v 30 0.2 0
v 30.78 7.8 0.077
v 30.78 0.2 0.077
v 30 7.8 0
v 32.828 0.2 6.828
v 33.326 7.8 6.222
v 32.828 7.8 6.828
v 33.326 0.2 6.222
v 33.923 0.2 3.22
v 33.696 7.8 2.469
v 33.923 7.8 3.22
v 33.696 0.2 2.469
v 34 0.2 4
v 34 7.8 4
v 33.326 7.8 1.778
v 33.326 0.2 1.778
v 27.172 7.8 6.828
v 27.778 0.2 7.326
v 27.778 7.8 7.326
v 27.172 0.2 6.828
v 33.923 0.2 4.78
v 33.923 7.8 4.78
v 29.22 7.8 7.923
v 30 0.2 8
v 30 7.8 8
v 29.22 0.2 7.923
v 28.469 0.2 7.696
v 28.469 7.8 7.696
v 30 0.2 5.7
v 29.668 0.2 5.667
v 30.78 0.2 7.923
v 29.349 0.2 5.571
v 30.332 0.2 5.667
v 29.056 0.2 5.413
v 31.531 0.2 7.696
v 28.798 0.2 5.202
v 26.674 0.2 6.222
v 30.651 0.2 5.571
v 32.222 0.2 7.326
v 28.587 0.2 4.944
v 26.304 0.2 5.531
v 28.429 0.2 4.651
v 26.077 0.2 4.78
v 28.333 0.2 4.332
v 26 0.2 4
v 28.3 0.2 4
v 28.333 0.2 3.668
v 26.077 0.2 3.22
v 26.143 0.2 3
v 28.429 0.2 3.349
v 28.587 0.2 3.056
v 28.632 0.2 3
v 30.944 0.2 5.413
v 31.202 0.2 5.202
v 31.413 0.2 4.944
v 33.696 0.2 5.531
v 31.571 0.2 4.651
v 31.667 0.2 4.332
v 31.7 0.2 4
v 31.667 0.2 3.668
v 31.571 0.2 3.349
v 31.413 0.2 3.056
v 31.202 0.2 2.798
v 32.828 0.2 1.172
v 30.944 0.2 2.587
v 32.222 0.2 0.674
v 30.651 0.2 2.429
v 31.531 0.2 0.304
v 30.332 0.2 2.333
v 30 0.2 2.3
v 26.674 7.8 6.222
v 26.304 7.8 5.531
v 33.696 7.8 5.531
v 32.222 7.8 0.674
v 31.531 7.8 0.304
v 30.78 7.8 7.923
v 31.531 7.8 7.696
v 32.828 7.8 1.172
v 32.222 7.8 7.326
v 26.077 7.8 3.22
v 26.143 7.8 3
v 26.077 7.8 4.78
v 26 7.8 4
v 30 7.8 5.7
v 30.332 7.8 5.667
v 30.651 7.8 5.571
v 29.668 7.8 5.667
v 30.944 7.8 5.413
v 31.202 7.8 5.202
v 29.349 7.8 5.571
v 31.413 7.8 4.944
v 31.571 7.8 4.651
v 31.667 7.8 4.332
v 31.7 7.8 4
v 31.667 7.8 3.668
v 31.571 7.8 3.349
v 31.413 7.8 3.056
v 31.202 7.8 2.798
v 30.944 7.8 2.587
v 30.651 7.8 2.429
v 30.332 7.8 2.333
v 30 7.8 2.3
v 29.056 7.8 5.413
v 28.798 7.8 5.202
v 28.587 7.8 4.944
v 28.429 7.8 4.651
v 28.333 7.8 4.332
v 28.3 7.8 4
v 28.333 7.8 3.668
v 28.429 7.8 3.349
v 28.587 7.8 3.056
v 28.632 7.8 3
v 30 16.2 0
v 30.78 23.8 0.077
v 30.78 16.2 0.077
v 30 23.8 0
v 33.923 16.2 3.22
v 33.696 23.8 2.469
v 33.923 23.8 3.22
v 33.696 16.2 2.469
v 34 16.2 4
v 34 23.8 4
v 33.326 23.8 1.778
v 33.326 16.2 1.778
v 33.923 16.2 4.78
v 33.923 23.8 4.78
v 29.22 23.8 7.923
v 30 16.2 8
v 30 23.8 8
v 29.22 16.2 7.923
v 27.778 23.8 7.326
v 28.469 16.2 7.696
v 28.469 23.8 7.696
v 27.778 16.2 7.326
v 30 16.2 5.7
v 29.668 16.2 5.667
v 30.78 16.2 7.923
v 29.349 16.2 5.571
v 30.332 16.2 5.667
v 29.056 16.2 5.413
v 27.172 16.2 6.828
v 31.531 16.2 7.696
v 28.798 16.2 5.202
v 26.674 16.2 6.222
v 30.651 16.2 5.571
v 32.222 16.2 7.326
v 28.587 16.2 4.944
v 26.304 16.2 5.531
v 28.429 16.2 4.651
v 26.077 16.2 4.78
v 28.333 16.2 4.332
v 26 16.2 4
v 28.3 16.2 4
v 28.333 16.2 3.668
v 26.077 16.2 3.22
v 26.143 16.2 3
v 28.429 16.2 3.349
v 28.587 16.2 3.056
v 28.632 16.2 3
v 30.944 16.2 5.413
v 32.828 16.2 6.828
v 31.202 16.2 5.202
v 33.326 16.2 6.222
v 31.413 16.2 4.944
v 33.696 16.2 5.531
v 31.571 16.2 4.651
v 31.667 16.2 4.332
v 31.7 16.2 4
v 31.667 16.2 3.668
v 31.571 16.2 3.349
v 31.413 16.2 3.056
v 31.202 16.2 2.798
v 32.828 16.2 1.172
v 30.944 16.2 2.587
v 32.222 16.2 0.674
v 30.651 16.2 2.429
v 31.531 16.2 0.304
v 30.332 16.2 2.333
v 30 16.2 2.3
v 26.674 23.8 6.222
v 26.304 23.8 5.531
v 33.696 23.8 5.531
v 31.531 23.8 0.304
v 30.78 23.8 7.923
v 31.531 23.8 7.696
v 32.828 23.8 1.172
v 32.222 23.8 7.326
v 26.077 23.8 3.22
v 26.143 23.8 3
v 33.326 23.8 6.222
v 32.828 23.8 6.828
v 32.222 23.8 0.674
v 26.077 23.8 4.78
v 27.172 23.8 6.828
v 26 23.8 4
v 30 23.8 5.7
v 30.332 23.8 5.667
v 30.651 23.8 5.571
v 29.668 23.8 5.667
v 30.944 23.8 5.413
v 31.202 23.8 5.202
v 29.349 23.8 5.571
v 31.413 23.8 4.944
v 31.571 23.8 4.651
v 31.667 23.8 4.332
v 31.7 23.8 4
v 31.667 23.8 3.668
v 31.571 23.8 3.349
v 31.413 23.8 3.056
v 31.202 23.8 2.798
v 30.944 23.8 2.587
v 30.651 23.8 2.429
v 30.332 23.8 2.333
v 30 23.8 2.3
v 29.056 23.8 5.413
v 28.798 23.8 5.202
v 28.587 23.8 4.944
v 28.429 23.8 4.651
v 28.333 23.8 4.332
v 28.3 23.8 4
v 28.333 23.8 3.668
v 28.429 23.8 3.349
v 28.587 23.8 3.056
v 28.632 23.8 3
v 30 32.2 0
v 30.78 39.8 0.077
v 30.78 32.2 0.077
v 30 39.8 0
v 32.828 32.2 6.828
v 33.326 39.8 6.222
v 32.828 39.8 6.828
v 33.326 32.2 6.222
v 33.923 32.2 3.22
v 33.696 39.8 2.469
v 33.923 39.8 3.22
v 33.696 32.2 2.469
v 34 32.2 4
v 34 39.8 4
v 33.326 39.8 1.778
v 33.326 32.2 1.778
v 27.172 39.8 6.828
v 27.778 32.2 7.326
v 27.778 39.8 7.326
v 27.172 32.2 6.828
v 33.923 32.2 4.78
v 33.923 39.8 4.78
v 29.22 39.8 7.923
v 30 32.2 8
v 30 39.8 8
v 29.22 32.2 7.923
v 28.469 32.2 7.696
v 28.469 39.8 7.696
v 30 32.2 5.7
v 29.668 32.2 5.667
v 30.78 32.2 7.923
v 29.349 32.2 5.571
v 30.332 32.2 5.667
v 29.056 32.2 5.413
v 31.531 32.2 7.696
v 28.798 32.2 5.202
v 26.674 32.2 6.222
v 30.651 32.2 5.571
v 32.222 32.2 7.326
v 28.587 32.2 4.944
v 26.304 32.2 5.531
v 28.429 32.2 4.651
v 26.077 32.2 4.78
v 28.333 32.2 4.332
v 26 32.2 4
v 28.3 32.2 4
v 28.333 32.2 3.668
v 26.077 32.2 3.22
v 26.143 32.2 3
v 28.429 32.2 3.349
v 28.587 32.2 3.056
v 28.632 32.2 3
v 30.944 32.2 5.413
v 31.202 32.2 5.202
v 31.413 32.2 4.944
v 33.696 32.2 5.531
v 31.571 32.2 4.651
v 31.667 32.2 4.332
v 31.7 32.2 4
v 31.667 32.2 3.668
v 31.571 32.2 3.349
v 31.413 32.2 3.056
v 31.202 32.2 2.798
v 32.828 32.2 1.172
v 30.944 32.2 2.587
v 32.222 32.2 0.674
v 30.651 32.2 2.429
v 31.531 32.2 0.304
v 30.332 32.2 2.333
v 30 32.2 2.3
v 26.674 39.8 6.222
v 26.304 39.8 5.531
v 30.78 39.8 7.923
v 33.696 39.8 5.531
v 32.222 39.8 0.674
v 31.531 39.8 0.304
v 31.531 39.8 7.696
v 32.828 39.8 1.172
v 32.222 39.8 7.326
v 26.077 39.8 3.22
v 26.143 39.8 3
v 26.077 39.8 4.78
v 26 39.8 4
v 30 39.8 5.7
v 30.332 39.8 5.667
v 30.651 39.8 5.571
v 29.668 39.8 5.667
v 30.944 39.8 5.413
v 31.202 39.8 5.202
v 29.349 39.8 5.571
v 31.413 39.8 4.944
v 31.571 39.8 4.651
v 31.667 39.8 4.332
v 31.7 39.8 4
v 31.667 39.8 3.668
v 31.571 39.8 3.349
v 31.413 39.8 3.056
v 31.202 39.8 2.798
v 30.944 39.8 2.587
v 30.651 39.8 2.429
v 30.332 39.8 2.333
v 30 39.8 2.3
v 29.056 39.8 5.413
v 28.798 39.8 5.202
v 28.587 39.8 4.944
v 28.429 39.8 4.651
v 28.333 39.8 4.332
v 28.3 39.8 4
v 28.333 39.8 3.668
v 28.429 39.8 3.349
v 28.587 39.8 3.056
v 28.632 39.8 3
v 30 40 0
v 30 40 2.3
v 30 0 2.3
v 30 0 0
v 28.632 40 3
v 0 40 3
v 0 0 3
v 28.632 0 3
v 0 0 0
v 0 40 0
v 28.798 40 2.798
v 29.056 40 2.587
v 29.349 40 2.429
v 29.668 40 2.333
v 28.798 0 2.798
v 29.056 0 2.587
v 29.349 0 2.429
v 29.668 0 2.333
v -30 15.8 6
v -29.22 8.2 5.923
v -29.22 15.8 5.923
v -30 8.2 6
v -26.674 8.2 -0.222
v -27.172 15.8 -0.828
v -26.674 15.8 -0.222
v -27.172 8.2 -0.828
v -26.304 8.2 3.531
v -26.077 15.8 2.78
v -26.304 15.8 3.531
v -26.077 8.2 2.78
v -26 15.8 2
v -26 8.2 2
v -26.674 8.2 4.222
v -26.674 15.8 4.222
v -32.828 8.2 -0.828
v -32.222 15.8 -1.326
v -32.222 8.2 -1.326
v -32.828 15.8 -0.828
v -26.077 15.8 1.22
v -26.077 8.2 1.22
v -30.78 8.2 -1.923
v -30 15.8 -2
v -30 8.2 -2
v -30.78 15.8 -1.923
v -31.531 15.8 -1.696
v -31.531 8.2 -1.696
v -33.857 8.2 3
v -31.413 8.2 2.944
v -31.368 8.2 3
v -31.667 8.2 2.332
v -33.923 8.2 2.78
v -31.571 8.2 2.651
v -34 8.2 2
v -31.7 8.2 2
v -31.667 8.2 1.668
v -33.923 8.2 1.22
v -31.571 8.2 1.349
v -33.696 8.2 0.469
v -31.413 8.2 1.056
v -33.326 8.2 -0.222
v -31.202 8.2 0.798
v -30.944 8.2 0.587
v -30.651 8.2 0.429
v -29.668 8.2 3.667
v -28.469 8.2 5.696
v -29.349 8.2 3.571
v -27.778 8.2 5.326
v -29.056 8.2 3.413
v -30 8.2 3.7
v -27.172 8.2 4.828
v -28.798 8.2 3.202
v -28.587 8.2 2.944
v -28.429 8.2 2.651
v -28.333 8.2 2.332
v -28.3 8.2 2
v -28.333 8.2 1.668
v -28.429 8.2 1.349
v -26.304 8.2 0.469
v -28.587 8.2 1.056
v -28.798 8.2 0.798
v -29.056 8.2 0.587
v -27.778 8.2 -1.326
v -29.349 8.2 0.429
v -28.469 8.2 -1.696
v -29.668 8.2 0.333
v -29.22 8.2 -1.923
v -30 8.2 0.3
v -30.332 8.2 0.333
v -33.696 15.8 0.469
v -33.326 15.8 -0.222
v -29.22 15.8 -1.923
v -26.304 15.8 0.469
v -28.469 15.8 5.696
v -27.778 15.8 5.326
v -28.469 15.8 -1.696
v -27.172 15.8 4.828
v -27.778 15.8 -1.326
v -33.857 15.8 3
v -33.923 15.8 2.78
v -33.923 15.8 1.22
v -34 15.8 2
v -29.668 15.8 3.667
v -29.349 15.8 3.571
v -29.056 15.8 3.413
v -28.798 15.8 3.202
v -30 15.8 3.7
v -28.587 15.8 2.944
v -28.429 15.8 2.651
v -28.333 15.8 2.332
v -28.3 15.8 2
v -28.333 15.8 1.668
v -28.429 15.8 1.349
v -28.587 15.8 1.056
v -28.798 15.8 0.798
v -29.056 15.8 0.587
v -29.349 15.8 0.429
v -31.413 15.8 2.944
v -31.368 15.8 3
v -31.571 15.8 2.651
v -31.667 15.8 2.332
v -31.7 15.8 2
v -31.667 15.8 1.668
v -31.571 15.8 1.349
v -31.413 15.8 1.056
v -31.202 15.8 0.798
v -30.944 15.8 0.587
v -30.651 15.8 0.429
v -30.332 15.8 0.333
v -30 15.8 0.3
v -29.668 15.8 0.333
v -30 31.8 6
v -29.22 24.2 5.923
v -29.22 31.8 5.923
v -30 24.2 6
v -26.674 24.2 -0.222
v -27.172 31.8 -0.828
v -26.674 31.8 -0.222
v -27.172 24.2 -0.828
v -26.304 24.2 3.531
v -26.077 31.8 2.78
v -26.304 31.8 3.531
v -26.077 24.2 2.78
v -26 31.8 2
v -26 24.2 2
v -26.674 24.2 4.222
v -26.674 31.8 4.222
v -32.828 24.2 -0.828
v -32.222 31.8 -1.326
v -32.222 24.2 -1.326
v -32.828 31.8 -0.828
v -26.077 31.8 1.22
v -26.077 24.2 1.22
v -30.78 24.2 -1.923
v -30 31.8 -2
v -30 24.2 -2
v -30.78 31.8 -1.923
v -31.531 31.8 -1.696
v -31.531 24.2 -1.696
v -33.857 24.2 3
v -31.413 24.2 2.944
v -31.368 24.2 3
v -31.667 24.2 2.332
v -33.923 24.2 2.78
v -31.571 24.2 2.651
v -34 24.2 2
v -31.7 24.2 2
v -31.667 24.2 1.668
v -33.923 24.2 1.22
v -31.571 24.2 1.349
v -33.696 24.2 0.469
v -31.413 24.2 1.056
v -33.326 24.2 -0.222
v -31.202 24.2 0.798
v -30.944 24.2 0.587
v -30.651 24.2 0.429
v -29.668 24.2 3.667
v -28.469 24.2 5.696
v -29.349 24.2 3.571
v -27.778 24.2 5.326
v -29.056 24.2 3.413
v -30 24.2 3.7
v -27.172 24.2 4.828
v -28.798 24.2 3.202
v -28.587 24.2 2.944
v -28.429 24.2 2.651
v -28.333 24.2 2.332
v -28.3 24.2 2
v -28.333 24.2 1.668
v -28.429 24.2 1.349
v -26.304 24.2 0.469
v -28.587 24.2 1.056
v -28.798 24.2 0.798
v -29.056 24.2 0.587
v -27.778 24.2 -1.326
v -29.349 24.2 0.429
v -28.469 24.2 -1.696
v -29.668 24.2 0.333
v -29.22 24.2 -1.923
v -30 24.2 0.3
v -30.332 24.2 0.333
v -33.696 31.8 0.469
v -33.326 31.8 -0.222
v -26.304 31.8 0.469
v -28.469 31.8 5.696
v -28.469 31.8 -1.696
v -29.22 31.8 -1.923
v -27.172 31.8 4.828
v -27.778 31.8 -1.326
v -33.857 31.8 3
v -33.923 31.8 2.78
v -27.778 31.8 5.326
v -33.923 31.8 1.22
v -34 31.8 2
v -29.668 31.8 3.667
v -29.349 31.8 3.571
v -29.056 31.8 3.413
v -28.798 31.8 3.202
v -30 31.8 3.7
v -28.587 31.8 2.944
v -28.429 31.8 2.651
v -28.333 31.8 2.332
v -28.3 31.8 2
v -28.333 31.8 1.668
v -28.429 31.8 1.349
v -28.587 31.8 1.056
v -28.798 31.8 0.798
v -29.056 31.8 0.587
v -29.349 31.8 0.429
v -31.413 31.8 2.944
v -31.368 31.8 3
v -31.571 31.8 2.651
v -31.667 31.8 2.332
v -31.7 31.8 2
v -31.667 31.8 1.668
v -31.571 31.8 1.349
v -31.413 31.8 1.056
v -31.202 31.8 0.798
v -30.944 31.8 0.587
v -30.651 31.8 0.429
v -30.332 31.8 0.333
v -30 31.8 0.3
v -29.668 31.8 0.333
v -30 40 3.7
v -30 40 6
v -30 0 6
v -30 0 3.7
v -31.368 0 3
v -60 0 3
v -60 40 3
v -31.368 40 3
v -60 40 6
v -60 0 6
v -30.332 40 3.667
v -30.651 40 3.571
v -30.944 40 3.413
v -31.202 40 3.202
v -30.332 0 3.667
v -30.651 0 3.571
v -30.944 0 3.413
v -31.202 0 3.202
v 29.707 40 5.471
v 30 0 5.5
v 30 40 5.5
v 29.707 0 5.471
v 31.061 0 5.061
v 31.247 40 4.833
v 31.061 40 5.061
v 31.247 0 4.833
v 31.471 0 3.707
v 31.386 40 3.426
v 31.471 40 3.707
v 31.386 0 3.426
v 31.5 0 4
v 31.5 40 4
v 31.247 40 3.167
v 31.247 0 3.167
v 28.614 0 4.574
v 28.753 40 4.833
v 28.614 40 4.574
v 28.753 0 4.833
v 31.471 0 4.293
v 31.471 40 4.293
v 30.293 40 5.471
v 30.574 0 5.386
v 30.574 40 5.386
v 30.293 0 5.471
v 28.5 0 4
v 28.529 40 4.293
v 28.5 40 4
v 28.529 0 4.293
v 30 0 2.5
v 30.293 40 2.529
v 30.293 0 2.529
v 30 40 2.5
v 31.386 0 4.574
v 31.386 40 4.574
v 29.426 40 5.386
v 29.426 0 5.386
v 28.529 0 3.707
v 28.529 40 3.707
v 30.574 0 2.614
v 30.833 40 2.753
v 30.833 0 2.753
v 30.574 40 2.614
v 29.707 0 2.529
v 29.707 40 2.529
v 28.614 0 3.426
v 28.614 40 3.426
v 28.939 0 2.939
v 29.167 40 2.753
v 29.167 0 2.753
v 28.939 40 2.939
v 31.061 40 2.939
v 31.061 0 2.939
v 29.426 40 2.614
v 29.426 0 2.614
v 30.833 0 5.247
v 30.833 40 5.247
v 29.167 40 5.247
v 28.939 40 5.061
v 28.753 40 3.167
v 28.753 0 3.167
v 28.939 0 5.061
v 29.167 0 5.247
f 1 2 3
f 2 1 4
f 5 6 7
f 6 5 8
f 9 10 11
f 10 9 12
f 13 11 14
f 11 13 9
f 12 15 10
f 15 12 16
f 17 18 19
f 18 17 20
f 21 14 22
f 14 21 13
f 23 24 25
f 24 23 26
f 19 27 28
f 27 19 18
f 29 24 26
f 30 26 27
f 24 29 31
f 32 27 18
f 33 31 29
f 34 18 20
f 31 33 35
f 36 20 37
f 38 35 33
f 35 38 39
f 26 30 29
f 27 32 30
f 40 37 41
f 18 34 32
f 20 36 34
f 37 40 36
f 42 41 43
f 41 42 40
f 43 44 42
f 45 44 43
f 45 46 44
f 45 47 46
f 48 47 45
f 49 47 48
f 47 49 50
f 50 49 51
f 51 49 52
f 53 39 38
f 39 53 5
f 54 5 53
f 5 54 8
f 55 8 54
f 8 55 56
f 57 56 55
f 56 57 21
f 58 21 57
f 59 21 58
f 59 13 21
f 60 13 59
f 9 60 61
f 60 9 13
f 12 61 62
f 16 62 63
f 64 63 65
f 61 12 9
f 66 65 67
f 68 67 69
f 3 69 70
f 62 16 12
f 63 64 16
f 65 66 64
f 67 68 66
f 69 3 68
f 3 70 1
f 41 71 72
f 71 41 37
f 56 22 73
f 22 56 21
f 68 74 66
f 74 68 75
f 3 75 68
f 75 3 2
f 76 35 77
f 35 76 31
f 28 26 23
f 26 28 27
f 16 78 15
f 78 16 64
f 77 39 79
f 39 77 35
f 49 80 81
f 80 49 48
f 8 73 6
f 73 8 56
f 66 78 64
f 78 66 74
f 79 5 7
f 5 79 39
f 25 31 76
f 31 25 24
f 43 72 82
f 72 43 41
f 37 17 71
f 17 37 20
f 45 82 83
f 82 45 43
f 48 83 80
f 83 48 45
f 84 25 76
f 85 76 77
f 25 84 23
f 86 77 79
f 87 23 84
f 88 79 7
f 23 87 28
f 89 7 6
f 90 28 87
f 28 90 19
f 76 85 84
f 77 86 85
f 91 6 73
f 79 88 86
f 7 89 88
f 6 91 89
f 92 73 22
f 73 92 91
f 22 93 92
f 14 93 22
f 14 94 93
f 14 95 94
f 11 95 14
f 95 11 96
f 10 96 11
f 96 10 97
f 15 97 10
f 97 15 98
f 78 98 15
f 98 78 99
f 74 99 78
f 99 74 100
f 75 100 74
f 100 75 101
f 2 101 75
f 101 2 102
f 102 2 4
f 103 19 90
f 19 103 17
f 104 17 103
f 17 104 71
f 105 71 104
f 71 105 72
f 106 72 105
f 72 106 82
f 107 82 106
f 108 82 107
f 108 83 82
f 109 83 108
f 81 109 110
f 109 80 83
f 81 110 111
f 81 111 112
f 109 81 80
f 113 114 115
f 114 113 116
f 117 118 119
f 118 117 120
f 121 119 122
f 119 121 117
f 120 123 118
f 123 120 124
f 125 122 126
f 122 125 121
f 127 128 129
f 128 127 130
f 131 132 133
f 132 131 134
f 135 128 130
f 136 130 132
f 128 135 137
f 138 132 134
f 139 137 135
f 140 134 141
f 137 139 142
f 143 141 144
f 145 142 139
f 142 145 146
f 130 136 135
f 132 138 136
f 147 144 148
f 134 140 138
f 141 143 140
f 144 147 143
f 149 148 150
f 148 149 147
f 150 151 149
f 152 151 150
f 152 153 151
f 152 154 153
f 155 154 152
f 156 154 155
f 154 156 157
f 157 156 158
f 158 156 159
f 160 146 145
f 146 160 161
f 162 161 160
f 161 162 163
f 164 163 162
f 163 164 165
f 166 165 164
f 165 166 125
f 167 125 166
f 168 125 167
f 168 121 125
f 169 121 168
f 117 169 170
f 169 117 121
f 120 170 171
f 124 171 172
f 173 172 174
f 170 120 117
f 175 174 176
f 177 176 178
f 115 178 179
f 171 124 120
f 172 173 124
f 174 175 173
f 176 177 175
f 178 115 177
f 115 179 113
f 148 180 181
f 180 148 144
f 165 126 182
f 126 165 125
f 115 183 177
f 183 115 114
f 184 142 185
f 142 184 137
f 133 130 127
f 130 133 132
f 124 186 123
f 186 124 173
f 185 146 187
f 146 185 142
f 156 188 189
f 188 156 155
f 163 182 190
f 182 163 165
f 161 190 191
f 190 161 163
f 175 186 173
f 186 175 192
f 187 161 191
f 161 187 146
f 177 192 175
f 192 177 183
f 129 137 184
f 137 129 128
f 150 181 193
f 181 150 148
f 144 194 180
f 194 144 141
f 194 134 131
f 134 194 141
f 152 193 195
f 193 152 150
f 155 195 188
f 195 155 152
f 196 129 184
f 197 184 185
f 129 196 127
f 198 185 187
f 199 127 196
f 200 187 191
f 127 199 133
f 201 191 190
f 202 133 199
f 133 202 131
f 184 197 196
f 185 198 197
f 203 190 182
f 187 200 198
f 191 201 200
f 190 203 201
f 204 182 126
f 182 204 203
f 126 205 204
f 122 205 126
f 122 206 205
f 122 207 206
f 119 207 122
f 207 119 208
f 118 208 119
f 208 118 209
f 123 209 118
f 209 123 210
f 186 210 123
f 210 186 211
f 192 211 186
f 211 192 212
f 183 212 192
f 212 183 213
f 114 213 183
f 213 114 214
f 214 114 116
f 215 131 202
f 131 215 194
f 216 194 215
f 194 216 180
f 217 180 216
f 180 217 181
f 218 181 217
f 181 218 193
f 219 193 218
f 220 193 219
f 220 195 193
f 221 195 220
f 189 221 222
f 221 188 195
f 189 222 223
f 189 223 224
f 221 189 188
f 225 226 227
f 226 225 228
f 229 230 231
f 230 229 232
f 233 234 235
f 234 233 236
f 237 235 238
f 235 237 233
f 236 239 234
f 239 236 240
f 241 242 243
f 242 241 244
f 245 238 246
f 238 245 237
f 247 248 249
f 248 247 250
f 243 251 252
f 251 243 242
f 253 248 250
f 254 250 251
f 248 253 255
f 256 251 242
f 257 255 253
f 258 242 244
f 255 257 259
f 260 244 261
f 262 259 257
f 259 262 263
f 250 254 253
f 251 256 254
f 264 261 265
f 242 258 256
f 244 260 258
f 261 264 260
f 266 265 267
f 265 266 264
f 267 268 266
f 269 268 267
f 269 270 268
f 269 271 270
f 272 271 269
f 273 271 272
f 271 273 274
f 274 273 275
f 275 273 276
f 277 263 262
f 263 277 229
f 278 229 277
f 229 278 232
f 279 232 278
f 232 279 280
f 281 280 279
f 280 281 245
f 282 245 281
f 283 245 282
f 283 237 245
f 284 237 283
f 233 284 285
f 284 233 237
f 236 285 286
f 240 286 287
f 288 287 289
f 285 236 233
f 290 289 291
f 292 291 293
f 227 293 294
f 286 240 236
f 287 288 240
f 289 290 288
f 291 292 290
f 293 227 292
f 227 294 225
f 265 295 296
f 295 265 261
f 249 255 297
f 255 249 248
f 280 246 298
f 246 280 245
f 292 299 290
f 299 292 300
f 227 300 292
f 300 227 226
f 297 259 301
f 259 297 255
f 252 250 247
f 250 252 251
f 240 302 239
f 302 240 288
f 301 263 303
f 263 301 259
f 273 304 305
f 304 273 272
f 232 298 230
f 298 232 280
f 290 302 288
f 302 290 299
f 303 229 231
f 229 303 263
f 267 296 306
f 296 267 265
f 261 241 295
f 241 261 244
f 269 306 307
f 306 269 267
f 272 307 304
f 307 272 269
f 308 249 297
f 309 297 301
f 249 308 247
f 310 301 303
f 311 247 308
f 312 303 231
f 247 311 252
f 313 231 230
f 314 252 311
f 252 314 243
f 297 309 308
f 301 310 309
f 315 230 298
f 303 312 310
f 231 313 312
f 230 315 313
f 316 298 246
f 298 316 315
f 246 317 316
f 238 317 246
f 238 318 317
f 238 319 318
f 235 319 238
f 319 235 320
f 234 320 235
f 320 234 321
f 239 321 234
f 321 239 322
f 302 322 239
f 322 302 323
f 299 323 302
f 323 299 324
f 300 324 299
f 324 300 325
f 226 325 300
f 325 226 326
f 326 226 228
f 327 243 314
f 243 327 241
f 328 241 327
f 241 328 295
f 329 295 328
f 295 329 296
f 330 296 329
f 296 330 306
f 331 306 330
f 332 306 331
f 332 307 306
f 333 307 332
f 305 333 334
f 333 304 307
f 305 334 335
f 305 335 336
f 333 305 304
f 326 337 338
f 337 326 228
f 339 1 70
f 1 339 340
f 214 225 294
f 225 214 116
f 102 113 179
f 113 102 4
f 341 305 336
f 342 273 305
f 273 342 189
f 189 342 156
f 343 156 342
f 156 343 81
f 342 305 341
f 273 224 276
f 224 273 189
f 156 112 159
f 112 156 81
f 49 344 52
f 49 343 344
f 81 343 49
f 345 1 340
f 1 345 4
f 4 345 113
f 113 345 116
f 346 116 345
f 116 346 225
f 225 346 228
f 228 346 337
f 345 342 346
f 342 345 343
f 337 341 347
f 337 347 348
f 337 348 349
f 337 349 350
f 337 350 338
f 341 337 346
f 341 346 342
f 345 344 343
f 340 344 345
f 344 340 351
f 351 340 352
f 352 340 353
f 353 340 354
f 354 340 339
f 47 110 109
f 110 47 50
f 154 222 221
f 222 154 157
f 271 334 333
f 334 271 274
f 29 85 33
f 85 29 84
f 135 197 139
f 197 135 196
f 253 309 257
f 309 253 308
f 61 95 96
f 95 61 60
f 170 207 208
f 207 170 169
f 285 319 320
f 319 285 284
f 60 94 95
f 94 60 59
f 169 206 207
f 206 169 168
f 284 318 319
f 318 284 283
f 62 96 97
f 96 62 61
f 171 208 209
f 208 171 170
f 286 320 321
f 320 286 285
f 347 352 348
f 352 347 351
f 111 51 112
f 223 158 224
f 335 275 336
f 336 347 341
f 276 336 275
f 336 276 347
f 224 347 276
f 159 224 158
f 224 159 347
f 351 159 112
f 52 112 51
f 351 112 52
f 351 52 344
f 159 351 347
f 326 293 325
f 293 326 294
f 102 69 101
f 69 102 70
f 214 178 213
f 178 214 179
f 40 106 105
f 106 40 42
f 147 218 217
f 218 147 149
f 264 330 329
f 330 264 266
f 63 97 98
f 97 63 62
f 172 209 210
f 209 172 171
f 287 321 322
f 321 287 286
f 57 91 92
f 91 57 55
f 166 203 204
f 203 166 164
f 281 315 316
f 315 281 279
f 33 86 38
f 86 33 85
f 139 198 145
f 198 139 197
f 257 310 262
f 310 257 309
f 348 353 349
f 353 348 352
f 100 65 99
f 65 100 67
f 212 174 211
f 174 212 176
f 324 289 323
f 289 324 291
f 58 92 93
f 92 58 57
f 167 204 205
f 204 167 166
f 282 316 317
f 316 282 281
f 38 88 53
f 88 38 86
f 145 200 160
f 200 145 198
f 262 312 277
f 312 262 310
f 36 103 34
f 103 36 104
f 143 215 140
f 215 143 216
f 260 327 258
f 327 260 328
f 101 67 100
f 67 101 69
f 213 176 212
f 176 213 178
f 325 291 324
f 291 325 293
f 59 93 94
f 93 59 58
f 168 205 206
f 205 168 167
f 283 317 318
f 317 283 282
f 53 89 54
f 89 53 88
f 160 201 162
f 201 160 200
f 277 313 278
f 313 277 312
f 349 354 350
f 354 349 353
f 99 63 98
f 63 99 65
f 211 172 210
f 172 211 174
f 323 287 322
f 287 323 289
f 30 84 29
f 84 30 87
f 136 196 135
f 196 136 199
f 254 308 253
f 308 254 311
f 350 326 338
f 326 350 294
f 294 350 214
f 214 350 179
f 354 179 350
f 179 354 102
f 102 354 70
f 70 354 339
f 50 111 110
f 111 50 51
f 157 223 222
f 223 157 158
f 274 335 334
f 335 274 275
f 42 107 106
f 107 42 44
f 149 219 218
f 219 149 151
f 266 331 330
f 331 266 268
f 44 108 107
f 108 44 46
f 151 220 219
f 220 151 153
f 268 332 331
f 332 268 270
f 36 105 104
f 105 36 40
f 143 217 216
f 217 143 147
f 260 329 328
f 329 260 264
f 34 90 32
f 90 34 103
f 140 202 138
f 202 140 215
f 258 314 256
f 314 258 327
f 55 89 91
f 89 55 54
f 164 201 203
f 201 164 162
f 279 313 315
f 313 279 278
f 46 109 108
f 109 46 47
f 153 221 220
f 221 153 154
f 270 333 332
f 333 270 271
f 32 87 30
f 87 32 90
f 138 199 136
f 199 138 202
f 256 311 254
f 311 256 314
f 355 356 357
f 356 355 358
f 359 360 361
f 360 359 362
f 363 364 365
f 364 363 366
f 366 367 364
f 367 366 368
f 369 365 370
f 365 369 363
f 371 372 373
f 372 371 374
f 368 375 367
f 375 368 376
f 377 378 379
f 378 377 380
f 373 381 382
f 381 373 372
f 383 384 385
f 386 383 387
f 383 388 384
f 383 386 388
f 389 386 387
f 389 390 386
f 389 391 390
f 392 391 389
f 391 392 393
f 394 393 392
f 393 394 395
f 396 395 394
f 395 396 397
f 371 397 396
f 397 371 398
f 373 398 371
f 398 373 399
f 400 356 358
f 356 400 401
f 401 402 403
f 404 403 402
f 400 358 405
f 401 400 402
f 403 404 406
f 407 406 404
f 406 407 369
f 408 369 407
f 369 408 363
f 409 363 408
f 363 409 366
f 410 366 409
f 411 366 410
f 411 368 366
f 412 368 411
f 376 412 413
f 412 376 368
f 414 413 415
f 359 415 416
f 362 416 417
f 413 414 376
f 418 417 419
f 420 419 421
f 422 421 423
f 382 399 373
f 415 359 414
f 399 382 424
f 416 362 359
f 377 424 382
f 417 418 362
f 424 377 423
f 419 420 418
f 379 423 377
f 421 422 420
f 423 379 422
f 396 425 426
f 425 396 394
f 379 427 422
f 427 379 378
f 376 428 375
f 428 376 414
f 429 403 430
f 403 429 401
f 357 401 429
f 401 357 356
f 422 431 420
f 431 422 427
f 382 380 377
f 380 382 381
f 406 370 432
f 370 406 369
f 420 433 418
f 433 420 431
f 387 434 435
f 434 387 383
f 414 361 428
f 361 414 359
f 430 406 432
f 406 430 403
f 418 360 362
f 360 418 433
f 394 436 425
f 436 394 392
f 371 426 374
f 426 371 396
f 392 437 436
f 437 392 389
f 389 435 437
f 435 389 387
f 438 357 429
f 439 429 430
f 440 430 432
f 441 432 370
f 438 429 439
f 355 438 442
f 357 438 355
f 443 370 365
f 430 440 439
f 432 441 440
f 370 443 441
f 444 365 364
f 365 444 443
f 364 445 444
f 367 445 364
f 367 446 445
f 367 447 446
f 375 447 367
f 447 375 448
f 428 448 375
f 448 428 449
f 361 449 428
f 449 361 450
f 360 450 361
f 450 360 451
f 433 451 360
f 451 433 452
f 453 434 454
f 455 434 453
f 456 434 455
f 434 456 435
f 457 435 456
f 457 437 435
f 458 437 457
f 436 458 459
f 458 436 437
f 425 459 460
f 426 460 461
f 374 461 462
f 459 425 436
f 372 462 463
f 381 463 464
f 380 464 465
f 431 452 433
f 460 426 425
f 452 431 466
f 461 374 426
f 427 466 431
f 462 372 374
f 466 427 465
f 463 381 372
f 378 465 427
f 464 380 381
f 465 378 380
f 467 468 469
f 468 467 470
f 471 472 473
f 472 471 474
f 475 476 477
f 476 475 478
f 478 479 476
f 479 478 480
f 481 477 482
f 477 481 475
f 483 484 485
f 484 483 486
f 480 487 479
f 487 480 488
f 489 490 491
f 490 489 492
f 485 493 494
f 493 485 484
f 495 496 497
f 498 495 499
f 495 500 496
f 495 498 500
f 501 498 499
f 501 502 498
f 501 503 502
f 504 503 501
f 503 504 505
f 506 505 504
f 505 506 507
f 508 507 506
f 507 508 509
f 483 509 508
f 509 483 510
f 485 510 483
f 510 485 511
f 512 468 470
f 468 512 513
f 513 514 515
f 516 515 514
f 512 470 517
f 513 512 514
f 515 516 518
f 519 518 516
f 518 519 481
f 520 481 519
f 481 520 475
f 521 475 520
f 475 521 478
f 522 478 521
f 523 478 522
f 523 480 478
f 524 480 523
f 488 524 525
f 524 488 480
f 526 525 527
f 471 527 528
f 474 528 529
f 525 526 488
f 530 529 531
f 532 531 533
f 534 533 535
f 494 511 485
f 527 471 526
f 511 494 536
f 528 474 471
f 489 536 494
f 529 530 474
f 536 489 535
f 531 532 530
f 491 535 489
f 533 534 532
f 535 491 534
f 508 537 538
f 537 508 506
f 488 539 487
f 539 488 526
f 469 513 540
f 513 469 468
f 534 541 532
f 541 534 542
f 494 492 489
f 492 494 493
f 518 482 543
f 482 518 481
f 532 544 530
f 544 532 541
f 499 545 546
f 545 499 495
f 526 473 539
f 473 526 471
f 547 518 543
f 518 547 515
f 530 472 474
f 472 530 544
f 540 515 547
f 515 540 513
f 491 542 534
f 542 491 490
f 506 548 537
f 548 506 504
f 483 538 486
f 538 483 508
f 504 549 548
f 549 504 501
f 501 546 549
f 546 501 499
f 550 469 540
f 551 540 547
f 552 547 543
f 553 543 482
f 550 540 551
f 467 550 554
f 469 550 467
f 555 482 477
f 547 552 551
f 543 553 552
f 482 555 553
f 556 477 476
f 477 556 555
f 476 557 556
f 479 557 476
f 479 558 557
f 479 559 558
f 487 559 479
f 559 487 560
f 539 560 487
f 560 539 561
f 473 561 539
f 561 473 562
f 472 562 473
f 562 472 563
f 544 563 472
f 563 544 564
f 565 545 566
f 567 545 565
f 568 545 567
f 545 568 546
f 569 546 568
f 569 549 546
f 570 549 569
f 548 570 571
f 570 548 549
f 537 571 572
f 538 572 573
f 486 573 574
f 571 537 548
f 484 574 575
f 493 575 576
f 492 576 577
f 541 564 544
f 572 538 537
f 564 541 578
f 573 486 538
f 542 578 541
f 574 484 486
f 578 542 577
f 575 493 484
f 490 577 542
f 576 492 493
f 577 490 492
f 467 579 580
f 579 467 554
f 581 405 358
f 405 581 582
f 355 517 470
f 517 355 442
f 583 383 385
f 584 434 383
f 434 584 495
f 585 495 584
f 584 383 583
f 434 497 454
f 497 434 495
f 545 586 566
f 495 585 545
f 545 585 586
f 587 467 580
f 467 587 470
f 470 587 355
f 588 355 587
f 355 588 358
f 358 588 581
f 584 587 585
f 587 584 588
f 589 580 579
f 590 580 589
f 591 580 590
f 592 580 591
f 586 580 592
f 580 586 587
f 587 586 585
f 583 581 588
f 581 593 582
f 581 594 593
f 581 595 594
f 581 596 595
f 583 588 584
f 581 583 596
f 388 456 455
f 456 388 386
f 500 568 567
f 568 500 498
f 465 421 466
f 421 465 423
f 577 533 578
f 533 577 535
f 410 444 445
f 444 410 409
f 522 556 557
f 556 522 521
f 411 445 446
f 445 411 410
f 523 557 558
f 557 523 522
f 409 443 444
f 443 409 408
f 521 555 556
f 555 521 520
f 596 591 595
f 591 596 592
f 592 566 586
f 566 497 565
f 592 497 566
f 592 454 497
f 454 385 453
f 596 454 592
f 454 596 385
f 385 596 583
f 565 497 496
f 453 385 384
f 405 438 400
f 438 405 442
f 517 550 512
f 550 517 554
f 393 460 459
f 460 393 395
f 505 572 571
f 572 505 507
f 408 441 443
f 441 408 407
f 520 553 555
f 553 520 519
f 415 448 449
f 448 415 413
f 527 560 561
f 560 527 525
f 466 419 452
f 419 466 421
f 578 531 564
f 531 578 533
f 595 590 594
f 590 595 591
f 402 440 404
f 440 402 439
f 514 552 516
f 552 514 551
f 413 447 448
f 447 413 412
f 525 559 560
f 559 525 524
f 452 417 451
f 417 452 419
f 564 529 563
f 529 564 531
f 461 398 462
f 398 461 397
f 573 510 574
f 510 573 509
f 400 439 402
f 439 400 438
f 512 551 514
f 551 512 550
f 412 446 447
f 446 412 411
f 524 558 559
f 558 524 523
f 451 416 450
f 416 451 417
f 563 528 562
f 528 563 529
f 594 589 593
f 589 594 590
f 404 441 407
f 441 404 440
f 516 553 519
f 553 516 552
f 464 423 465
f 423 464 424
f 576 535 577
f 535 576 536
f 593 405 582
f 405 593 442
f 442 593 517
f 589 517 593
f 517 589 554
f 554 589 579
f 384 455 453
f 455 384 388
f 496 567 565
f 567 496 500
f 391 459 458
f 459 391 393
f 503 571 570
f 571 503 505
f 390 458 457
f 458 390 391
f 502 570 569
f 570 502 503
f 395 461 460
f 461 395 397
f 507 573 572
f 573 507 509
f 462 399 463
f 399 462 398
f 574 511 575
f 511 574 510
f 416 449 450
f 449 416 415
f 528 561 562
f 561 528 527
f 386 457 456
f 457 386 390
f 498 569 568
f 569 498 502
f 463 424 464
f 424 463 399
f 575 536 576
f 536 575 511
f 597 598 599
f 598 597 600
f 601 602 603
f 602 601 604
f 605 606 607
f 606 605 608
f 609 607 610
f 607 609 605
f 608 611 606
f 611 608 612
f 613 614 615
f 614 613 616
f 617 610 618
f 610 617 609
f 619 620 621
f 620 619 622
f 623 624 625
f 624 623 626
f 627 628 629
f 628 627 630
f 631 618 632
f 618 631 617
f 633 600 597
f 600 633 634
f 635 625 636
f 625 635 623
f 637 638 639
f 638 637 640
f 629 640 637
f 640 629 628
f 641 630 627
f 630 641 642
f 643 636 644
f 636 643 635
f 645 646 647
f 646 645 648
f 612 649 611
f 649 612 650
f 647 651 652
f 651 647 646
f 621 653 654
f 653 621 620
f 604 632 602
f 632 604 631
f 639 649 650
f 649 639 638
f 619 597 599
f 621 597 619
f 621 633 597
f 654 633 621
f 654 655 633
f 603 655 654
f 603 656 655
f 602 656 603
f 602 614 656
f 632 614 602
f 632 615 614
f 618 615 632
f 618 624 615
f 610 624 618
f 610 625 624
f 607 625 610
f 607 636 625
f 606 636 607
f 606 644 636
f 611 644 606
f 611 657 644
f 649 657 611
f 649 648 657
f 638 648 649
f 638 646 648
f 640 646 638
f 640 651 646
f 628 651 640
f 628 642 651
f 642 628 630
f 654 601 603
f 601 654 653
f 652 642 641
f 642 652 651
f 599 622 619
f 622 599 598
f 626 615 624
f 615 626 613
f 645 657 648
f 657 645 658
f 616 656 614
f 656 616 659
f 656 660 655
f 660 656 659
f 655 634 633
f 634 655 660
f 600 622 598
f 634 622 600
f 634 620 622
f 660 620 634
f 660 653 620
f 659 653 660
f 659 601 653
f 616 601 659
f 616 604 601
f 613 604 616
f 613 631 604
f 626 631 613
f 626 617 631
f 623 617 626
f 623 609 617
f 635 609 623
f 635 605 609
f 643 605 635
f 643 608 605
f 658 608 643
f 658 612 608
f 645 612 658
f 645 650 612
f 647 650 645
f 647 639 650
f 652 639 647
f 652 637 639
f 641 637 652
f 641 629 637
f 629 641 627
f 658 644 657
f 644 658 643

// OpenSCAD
// Parametric print-in-place hinge
// Designed to print as one piece with proper clearances

hinge_width = 40;
hinge_length = 30;
hinge_thickness = 3;
barrel_diameter = 8;
num_knuckles = 5;
clearance = 0.4;  // Gap for print-in-place
pin_diameter = 3;

$fn = 32;

knuckle_width = hinge_width / num_knuckles;

module hinge_leaf(side=0) {
    // side: 0 = left (odd knuckles), 1 = right (even knuckles)
    
    difference() {
        union() {
            // Flat part
            cube([hinge_length, hinge_width, hinge_thickness]);
            
            // Barrel knuckles
            for (i = [side : 2 : num_knuckles-1]) {
                translate([hinge_length, i * knuckle_width + clearance/2, barrel_diameter/2])
                rotate([-90, 0, 0])
                cylinder(d=barrel_diameter, h=knuckle_width - clearance);
            }
        }
        
        // Pin hole through all knuckles
        translate([hinge_length, -1, barrel_diameter/2])
        rotate([-90, 0, 0])
        cylinder(d=pin_diameter + clearance, h=hinge_width + 2);
    }
}

module hinge_pin() {
    translate([hinge_length, 0, barrel_diameter/2])
    rotate([-90, 0, 0])
    cylinder(d=pin_diameter, h=hinge_width);
}

// Assemble hinge (print-in-place)
hinge_leaf(0);

translate([0, 0, hinge_thickness])
mirror([0, 0, 1])
translate([-hinge_length*2, 0, -hinge_thickness])
hinge_leaf(1);

// Pin (optional - can be printed separately or use filament)
color("silver")
hinge_pin();
